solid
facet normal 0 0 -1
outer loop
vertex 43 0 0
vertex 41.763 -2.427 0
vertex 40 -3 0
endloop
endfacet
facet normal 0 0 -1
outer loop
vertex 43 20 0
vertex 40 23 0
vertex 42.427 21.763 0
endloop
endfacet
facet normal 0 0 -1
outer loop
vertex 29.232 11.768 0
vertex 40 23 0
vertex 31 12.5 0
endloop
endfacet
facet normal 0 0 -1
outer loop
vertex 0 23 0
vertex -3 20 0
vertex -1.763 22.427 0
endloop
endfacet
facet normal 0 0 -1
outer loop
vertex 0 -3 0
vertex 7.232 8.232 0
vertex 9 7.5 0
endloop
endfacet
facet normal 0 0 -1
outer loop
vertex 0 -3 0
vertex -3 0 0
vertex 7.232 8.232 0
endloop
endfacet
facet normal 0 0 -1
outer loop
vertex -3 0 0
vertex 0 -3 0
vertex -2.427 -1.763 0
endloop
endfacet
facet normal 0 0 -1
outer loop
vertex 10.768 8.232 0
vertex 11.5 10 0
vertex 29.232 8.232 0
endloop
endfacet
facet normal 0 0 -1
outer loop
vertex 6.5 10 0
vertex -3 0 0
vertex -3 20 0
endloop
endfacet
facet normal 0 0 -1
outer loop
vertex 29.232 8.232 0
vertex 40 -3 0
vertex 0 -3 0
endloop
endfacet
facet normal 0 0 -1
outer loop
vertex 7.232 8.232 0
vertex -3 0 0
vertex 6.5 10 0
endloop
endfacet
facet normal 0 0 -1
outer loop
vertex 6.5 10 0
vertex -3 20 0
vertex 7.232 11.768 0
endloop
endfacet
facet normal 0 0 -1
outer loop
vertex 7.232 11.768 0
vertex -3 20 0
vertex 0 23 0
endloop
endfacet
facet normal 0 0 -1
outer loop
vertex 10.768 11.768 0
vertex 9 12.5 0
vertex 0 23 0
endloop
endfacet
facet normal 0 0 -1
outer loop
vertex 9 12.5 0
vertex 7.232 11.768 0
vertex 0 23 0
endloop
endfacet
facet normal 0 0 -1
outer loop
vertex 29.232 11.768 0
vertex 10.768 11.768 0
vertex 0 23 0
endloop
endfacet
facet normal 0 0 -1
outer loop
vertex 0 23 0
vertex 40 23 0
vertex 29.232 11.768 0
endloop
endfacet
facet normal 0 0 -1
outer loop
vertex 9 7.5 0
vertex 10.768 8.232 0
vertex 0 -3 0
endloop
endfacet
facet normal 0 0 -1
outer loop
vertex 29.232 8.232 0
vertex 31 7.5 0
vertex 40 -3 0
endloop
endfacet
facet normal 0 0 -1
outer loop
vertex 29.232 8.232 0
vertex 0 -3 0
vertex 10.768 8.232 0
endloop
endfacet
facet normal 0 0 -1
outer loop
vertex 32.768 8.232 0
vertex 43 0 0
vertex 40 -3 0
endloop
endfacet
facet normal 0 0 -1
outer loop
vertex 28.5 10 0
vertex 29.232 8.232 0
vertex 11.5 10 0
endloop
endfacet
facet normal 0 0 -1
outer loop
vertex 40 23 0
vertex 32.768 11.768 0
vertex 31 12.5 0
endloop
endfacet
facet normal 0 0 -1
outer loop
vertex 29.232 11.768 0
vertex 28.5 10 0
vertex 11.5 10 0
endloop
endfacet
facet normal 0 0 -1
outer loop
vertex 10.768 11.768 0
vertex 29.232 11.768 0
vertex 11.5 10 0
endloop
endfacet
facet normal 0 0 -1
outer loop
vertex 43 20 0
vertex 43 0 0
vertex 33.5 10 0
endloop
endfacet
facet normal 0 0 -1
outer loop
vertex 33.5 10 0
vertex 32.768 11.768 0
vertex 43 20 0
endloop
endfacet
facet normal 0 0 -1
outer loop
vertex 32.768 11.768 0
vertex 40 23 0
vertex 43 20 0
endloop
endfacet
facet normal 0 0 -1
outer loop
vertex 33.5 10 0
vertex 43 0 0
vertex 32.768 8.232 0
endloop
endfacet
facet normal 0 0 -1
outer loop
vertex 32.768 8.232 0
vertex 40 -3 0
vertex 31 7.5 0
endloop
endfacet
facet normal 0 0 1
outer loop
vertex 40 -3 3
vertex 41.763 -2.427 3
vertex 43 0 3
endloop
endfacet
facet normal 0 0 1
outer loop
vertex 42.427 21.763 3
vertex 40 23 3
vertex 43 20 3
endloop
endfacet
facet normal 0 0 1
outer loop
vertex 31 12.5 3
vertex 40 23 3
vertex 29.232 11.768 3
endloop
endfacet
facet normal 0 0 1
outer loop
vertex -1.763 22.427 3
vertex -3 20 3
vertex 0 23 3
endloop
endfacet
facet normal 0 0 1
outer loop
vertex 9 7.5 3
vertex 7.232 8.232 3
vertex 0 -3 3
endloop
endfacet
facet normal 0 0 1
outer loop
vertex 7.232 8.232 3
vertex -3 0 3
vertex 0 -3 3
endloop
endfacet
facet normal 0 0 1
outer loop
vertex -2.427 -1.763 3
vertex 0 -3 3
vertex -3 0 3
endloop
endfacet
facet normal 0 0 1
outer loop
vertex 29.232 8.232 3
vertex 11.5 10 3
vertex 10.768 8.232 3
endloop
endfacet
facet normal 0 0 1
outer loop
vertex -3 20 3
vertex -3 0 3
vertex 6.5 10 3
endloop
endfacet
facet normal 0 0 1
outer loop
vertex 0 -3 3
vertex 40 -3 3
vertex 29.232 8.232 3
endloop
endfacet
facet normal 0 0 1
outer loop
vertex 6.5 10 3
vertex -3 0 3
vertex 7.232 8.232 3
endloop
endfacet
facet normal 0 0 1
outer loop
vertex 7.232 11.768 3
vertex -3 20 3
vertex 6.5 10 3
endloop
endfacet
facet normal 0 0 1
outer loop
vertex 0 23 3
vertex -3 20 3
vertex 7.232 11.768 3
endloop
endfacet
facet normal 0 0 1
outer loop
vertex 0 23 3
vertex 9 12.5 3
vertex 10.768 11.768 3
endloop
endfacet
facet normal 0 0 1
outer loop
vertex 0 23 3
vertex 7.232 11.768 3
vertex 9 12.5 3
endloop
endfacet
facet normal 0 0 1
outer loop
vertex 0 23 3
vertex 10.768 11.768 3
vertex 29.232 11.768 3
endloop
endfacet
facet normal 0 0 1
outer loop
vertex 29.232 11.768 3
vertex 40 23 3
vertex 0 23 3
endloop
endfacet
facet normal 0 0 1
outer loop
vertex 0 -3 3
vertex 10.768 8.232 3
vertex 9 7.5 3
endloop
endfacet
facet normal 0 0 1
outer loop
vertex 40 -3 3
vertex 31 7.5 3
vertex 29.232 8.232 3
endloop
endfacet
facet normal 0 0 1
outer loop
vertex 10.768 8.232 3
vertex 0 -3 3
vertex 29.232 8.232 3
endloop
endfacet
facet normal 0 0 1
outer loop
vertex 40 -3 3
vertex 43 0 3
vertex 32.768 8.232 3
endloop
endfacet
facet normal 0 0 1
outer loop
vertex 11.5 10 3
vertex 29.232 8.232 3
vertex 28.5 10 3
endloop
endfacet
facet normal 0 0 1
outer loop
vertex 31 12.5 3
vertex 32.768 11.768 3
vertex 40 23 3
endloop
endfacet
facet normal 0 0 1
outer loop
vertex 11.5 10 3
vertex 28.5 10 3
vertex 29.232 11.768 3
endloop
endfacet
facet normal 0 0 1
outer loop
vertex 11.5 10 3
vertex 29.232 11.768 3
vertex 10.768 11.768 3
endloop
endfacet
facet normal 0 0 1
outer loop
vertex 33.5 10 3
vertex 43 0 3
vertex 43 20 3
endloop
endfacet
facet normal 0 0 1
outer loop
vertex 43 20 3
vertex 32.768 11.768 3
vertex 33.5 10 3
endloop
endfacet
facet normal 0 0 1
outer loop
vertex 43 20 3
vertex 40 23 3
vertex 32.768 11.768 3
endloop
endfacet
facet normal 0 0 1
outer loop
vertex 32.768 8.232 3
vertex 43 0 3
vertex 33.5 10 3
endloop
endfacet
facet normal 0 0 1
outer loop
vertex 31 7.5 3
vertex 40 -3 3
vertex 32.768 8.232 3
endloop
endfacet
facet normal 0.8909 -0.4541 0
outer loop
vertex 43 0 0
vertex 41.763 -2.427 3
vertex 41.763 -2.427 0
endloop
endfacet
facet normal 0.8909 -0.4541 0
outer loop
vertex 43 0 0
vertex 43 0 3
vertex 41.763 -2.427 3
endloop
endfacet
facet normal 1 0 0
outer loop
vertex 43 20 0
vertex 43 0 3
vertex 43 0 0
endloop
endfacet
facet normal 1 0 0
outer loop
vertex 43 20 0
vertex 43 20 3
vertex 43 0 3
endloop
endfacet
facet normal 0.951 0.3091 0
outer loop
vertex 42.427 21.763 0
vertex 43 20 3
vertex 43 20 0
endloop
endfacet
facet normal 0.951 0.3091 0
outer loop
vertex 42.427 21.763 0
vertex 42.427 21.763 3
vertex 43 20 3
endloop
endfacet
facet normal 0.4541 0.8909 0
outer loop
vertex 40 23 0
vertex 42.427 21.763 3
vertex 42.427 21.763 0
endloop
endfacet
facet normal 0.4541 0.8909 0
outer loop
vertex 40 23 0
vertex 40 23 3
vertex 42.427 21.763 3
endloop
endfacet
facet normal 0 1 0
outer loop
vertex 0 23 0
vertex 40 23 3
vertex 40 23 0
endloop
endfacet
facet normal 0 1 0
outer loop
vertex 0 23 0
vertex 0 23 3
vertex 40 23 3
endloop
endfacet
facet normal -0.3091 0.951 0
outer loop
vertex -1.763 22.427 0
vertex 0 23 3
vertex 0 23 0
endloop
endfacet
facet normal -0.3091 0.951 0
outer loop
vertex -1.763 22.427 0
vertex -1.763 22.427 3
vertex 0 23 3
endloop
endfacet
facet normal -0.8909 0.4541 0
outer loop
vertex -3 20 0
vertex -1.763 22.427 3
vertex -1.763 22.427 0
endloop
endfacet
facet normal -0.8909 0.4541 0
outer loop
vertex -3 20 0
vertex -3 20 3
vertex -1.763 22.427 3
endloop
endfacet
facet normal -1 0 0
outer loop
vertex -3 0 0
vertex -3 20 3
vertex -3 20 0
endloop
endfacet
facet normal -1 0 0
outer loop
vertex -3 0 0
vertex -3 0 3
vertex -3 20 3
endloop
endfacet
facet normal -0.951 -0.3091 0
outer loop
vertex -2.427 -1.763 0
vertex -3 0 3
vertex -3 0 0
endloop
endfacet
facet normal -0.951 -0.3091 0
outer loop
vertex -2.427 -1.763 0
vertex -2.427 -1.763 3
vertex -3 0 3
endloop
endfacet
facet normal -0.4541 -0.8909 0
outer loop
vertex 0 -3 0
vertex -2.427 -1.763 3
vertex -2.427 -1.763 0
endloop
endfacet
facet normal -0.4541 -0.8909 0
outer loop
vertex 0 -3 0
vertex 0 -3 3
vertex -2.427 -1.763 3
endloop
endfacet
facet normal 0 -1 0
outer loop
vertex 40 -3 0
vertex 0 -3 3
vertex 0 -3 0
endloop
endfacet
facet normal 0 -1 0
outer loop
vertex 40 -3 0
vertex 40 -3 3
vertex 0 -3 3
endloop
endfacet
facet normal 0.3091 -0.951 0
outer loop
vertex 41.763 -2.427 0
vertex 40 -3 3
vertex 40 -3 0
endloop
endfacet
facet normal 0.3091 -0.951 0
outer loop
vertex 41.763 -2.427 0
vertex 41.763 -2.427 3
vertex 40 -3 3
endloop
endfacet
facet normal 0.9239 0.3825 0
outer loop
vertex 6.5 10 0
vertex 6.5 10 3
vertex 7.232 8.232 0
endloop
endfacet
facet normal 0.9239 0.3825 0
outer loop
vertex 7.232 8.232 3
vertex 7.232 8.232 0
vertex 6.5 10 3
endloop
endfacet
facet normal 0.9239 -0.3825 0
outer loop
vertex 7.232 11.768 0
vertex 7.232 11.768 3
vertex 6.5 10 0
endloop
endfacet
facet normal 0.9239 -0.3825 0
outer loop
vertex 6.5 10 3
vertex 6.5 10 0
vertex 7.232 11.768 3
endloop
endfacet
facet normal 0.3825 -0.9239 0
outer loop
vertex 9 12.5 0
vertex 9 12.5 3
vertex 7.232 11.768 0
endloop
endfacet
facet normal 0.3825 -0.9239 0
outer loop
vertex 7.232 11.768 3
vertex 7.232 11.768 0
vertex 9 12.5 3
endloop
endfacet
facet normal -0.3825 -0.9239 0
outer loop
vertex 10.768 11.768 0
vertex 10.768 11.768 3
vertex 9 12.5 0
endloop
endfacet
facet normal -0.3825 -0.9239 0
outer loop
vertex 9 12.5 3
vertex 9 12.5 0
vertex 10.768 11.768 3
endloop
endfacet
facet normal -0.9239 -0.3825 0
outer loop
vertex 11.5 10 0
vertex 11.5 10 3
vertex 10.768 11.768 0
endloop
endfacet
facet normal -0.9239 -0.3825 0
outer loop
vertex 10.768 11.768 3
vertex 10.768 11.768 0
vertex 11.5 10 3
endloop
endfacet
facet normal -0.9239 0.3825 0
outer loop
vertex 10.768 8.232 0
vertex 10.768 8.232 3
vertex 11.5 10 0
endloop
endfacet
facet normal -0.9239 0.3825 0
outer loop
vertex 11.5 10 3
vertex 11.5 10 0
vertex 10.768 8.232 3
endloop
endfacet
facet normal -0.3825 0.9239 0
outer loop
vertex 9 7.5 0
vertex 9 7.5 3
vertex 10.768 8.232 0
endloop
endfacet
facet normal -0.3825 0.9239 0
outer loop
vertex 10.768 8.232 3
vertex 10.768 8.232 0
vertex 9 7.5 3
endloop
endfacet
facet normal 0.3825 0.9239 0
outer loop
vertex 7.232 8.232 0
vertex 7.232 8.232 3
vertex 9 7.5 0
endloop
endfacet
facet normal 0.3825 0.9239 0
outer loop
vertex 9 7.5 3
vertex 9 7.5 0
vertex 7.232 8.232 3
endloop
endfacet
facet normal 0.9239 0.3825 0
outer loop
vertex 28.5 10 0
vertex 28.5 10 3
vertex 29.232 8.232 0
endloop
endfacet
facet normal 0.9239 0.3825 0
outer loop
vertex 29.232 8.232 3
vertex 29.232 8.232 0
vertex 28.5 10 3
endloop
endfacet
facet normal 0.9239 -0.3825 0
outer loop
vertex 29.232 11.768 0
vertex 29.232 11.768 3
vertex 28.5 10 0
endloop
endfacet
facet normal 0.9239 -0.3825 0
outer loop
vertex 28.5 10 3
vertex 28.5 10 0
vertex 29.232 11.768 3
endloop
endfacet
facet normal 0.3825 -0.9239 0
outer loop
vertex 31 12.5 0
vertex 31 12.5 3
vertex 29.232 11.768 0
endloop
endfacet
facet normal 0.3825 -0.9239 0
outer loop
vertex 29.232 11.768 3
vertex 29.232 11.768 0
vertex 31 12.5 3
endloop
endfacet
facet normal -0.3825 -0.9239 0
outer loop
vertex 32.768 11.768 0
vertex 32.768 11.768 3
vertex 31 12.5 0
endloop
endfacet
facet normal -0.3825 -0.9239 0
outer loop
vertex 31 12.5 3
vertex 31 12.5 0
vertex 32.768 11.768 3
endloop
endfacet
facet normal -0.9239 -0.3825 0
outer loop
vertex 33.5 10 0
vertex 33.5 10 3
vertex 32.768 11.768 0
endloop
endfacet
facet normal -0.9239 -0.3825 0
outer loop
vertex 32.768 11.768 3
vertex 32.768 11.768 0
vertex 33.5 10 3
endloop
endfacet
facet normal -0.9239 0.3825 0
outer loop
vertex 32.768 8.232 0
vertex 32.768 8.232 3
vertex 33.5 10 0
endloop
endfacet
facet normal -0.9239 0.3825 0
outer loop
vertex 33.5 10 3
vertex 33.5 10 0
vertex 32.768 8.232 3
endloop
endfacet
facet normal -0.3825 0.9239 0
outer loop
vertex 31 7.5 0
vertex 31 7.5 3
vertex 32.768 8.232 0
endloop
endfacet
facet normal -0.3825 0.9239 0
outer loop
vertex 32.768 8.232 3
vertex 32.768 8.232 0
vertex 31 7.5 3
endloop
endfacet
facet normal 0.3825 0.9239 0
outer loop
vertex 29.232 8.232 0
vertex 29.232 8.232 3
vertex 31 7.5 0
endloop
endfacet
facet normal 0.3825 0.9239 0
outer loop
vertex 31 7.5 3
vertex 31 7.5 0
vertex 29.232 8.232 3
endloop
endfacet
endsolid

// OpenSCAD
// Rounded mounting plate with two bolt holes — 2D offset + boolean holes,
// then extruded. Circle resolution comes from $fa/$fs (no explicit $fn).
linear_extrude(3)
difference() {
    offset(r = 3) square([40, 20]);
    translate([9, 10])  circle(2.5);
    translate([31, 10]) circle(2.5);
}
